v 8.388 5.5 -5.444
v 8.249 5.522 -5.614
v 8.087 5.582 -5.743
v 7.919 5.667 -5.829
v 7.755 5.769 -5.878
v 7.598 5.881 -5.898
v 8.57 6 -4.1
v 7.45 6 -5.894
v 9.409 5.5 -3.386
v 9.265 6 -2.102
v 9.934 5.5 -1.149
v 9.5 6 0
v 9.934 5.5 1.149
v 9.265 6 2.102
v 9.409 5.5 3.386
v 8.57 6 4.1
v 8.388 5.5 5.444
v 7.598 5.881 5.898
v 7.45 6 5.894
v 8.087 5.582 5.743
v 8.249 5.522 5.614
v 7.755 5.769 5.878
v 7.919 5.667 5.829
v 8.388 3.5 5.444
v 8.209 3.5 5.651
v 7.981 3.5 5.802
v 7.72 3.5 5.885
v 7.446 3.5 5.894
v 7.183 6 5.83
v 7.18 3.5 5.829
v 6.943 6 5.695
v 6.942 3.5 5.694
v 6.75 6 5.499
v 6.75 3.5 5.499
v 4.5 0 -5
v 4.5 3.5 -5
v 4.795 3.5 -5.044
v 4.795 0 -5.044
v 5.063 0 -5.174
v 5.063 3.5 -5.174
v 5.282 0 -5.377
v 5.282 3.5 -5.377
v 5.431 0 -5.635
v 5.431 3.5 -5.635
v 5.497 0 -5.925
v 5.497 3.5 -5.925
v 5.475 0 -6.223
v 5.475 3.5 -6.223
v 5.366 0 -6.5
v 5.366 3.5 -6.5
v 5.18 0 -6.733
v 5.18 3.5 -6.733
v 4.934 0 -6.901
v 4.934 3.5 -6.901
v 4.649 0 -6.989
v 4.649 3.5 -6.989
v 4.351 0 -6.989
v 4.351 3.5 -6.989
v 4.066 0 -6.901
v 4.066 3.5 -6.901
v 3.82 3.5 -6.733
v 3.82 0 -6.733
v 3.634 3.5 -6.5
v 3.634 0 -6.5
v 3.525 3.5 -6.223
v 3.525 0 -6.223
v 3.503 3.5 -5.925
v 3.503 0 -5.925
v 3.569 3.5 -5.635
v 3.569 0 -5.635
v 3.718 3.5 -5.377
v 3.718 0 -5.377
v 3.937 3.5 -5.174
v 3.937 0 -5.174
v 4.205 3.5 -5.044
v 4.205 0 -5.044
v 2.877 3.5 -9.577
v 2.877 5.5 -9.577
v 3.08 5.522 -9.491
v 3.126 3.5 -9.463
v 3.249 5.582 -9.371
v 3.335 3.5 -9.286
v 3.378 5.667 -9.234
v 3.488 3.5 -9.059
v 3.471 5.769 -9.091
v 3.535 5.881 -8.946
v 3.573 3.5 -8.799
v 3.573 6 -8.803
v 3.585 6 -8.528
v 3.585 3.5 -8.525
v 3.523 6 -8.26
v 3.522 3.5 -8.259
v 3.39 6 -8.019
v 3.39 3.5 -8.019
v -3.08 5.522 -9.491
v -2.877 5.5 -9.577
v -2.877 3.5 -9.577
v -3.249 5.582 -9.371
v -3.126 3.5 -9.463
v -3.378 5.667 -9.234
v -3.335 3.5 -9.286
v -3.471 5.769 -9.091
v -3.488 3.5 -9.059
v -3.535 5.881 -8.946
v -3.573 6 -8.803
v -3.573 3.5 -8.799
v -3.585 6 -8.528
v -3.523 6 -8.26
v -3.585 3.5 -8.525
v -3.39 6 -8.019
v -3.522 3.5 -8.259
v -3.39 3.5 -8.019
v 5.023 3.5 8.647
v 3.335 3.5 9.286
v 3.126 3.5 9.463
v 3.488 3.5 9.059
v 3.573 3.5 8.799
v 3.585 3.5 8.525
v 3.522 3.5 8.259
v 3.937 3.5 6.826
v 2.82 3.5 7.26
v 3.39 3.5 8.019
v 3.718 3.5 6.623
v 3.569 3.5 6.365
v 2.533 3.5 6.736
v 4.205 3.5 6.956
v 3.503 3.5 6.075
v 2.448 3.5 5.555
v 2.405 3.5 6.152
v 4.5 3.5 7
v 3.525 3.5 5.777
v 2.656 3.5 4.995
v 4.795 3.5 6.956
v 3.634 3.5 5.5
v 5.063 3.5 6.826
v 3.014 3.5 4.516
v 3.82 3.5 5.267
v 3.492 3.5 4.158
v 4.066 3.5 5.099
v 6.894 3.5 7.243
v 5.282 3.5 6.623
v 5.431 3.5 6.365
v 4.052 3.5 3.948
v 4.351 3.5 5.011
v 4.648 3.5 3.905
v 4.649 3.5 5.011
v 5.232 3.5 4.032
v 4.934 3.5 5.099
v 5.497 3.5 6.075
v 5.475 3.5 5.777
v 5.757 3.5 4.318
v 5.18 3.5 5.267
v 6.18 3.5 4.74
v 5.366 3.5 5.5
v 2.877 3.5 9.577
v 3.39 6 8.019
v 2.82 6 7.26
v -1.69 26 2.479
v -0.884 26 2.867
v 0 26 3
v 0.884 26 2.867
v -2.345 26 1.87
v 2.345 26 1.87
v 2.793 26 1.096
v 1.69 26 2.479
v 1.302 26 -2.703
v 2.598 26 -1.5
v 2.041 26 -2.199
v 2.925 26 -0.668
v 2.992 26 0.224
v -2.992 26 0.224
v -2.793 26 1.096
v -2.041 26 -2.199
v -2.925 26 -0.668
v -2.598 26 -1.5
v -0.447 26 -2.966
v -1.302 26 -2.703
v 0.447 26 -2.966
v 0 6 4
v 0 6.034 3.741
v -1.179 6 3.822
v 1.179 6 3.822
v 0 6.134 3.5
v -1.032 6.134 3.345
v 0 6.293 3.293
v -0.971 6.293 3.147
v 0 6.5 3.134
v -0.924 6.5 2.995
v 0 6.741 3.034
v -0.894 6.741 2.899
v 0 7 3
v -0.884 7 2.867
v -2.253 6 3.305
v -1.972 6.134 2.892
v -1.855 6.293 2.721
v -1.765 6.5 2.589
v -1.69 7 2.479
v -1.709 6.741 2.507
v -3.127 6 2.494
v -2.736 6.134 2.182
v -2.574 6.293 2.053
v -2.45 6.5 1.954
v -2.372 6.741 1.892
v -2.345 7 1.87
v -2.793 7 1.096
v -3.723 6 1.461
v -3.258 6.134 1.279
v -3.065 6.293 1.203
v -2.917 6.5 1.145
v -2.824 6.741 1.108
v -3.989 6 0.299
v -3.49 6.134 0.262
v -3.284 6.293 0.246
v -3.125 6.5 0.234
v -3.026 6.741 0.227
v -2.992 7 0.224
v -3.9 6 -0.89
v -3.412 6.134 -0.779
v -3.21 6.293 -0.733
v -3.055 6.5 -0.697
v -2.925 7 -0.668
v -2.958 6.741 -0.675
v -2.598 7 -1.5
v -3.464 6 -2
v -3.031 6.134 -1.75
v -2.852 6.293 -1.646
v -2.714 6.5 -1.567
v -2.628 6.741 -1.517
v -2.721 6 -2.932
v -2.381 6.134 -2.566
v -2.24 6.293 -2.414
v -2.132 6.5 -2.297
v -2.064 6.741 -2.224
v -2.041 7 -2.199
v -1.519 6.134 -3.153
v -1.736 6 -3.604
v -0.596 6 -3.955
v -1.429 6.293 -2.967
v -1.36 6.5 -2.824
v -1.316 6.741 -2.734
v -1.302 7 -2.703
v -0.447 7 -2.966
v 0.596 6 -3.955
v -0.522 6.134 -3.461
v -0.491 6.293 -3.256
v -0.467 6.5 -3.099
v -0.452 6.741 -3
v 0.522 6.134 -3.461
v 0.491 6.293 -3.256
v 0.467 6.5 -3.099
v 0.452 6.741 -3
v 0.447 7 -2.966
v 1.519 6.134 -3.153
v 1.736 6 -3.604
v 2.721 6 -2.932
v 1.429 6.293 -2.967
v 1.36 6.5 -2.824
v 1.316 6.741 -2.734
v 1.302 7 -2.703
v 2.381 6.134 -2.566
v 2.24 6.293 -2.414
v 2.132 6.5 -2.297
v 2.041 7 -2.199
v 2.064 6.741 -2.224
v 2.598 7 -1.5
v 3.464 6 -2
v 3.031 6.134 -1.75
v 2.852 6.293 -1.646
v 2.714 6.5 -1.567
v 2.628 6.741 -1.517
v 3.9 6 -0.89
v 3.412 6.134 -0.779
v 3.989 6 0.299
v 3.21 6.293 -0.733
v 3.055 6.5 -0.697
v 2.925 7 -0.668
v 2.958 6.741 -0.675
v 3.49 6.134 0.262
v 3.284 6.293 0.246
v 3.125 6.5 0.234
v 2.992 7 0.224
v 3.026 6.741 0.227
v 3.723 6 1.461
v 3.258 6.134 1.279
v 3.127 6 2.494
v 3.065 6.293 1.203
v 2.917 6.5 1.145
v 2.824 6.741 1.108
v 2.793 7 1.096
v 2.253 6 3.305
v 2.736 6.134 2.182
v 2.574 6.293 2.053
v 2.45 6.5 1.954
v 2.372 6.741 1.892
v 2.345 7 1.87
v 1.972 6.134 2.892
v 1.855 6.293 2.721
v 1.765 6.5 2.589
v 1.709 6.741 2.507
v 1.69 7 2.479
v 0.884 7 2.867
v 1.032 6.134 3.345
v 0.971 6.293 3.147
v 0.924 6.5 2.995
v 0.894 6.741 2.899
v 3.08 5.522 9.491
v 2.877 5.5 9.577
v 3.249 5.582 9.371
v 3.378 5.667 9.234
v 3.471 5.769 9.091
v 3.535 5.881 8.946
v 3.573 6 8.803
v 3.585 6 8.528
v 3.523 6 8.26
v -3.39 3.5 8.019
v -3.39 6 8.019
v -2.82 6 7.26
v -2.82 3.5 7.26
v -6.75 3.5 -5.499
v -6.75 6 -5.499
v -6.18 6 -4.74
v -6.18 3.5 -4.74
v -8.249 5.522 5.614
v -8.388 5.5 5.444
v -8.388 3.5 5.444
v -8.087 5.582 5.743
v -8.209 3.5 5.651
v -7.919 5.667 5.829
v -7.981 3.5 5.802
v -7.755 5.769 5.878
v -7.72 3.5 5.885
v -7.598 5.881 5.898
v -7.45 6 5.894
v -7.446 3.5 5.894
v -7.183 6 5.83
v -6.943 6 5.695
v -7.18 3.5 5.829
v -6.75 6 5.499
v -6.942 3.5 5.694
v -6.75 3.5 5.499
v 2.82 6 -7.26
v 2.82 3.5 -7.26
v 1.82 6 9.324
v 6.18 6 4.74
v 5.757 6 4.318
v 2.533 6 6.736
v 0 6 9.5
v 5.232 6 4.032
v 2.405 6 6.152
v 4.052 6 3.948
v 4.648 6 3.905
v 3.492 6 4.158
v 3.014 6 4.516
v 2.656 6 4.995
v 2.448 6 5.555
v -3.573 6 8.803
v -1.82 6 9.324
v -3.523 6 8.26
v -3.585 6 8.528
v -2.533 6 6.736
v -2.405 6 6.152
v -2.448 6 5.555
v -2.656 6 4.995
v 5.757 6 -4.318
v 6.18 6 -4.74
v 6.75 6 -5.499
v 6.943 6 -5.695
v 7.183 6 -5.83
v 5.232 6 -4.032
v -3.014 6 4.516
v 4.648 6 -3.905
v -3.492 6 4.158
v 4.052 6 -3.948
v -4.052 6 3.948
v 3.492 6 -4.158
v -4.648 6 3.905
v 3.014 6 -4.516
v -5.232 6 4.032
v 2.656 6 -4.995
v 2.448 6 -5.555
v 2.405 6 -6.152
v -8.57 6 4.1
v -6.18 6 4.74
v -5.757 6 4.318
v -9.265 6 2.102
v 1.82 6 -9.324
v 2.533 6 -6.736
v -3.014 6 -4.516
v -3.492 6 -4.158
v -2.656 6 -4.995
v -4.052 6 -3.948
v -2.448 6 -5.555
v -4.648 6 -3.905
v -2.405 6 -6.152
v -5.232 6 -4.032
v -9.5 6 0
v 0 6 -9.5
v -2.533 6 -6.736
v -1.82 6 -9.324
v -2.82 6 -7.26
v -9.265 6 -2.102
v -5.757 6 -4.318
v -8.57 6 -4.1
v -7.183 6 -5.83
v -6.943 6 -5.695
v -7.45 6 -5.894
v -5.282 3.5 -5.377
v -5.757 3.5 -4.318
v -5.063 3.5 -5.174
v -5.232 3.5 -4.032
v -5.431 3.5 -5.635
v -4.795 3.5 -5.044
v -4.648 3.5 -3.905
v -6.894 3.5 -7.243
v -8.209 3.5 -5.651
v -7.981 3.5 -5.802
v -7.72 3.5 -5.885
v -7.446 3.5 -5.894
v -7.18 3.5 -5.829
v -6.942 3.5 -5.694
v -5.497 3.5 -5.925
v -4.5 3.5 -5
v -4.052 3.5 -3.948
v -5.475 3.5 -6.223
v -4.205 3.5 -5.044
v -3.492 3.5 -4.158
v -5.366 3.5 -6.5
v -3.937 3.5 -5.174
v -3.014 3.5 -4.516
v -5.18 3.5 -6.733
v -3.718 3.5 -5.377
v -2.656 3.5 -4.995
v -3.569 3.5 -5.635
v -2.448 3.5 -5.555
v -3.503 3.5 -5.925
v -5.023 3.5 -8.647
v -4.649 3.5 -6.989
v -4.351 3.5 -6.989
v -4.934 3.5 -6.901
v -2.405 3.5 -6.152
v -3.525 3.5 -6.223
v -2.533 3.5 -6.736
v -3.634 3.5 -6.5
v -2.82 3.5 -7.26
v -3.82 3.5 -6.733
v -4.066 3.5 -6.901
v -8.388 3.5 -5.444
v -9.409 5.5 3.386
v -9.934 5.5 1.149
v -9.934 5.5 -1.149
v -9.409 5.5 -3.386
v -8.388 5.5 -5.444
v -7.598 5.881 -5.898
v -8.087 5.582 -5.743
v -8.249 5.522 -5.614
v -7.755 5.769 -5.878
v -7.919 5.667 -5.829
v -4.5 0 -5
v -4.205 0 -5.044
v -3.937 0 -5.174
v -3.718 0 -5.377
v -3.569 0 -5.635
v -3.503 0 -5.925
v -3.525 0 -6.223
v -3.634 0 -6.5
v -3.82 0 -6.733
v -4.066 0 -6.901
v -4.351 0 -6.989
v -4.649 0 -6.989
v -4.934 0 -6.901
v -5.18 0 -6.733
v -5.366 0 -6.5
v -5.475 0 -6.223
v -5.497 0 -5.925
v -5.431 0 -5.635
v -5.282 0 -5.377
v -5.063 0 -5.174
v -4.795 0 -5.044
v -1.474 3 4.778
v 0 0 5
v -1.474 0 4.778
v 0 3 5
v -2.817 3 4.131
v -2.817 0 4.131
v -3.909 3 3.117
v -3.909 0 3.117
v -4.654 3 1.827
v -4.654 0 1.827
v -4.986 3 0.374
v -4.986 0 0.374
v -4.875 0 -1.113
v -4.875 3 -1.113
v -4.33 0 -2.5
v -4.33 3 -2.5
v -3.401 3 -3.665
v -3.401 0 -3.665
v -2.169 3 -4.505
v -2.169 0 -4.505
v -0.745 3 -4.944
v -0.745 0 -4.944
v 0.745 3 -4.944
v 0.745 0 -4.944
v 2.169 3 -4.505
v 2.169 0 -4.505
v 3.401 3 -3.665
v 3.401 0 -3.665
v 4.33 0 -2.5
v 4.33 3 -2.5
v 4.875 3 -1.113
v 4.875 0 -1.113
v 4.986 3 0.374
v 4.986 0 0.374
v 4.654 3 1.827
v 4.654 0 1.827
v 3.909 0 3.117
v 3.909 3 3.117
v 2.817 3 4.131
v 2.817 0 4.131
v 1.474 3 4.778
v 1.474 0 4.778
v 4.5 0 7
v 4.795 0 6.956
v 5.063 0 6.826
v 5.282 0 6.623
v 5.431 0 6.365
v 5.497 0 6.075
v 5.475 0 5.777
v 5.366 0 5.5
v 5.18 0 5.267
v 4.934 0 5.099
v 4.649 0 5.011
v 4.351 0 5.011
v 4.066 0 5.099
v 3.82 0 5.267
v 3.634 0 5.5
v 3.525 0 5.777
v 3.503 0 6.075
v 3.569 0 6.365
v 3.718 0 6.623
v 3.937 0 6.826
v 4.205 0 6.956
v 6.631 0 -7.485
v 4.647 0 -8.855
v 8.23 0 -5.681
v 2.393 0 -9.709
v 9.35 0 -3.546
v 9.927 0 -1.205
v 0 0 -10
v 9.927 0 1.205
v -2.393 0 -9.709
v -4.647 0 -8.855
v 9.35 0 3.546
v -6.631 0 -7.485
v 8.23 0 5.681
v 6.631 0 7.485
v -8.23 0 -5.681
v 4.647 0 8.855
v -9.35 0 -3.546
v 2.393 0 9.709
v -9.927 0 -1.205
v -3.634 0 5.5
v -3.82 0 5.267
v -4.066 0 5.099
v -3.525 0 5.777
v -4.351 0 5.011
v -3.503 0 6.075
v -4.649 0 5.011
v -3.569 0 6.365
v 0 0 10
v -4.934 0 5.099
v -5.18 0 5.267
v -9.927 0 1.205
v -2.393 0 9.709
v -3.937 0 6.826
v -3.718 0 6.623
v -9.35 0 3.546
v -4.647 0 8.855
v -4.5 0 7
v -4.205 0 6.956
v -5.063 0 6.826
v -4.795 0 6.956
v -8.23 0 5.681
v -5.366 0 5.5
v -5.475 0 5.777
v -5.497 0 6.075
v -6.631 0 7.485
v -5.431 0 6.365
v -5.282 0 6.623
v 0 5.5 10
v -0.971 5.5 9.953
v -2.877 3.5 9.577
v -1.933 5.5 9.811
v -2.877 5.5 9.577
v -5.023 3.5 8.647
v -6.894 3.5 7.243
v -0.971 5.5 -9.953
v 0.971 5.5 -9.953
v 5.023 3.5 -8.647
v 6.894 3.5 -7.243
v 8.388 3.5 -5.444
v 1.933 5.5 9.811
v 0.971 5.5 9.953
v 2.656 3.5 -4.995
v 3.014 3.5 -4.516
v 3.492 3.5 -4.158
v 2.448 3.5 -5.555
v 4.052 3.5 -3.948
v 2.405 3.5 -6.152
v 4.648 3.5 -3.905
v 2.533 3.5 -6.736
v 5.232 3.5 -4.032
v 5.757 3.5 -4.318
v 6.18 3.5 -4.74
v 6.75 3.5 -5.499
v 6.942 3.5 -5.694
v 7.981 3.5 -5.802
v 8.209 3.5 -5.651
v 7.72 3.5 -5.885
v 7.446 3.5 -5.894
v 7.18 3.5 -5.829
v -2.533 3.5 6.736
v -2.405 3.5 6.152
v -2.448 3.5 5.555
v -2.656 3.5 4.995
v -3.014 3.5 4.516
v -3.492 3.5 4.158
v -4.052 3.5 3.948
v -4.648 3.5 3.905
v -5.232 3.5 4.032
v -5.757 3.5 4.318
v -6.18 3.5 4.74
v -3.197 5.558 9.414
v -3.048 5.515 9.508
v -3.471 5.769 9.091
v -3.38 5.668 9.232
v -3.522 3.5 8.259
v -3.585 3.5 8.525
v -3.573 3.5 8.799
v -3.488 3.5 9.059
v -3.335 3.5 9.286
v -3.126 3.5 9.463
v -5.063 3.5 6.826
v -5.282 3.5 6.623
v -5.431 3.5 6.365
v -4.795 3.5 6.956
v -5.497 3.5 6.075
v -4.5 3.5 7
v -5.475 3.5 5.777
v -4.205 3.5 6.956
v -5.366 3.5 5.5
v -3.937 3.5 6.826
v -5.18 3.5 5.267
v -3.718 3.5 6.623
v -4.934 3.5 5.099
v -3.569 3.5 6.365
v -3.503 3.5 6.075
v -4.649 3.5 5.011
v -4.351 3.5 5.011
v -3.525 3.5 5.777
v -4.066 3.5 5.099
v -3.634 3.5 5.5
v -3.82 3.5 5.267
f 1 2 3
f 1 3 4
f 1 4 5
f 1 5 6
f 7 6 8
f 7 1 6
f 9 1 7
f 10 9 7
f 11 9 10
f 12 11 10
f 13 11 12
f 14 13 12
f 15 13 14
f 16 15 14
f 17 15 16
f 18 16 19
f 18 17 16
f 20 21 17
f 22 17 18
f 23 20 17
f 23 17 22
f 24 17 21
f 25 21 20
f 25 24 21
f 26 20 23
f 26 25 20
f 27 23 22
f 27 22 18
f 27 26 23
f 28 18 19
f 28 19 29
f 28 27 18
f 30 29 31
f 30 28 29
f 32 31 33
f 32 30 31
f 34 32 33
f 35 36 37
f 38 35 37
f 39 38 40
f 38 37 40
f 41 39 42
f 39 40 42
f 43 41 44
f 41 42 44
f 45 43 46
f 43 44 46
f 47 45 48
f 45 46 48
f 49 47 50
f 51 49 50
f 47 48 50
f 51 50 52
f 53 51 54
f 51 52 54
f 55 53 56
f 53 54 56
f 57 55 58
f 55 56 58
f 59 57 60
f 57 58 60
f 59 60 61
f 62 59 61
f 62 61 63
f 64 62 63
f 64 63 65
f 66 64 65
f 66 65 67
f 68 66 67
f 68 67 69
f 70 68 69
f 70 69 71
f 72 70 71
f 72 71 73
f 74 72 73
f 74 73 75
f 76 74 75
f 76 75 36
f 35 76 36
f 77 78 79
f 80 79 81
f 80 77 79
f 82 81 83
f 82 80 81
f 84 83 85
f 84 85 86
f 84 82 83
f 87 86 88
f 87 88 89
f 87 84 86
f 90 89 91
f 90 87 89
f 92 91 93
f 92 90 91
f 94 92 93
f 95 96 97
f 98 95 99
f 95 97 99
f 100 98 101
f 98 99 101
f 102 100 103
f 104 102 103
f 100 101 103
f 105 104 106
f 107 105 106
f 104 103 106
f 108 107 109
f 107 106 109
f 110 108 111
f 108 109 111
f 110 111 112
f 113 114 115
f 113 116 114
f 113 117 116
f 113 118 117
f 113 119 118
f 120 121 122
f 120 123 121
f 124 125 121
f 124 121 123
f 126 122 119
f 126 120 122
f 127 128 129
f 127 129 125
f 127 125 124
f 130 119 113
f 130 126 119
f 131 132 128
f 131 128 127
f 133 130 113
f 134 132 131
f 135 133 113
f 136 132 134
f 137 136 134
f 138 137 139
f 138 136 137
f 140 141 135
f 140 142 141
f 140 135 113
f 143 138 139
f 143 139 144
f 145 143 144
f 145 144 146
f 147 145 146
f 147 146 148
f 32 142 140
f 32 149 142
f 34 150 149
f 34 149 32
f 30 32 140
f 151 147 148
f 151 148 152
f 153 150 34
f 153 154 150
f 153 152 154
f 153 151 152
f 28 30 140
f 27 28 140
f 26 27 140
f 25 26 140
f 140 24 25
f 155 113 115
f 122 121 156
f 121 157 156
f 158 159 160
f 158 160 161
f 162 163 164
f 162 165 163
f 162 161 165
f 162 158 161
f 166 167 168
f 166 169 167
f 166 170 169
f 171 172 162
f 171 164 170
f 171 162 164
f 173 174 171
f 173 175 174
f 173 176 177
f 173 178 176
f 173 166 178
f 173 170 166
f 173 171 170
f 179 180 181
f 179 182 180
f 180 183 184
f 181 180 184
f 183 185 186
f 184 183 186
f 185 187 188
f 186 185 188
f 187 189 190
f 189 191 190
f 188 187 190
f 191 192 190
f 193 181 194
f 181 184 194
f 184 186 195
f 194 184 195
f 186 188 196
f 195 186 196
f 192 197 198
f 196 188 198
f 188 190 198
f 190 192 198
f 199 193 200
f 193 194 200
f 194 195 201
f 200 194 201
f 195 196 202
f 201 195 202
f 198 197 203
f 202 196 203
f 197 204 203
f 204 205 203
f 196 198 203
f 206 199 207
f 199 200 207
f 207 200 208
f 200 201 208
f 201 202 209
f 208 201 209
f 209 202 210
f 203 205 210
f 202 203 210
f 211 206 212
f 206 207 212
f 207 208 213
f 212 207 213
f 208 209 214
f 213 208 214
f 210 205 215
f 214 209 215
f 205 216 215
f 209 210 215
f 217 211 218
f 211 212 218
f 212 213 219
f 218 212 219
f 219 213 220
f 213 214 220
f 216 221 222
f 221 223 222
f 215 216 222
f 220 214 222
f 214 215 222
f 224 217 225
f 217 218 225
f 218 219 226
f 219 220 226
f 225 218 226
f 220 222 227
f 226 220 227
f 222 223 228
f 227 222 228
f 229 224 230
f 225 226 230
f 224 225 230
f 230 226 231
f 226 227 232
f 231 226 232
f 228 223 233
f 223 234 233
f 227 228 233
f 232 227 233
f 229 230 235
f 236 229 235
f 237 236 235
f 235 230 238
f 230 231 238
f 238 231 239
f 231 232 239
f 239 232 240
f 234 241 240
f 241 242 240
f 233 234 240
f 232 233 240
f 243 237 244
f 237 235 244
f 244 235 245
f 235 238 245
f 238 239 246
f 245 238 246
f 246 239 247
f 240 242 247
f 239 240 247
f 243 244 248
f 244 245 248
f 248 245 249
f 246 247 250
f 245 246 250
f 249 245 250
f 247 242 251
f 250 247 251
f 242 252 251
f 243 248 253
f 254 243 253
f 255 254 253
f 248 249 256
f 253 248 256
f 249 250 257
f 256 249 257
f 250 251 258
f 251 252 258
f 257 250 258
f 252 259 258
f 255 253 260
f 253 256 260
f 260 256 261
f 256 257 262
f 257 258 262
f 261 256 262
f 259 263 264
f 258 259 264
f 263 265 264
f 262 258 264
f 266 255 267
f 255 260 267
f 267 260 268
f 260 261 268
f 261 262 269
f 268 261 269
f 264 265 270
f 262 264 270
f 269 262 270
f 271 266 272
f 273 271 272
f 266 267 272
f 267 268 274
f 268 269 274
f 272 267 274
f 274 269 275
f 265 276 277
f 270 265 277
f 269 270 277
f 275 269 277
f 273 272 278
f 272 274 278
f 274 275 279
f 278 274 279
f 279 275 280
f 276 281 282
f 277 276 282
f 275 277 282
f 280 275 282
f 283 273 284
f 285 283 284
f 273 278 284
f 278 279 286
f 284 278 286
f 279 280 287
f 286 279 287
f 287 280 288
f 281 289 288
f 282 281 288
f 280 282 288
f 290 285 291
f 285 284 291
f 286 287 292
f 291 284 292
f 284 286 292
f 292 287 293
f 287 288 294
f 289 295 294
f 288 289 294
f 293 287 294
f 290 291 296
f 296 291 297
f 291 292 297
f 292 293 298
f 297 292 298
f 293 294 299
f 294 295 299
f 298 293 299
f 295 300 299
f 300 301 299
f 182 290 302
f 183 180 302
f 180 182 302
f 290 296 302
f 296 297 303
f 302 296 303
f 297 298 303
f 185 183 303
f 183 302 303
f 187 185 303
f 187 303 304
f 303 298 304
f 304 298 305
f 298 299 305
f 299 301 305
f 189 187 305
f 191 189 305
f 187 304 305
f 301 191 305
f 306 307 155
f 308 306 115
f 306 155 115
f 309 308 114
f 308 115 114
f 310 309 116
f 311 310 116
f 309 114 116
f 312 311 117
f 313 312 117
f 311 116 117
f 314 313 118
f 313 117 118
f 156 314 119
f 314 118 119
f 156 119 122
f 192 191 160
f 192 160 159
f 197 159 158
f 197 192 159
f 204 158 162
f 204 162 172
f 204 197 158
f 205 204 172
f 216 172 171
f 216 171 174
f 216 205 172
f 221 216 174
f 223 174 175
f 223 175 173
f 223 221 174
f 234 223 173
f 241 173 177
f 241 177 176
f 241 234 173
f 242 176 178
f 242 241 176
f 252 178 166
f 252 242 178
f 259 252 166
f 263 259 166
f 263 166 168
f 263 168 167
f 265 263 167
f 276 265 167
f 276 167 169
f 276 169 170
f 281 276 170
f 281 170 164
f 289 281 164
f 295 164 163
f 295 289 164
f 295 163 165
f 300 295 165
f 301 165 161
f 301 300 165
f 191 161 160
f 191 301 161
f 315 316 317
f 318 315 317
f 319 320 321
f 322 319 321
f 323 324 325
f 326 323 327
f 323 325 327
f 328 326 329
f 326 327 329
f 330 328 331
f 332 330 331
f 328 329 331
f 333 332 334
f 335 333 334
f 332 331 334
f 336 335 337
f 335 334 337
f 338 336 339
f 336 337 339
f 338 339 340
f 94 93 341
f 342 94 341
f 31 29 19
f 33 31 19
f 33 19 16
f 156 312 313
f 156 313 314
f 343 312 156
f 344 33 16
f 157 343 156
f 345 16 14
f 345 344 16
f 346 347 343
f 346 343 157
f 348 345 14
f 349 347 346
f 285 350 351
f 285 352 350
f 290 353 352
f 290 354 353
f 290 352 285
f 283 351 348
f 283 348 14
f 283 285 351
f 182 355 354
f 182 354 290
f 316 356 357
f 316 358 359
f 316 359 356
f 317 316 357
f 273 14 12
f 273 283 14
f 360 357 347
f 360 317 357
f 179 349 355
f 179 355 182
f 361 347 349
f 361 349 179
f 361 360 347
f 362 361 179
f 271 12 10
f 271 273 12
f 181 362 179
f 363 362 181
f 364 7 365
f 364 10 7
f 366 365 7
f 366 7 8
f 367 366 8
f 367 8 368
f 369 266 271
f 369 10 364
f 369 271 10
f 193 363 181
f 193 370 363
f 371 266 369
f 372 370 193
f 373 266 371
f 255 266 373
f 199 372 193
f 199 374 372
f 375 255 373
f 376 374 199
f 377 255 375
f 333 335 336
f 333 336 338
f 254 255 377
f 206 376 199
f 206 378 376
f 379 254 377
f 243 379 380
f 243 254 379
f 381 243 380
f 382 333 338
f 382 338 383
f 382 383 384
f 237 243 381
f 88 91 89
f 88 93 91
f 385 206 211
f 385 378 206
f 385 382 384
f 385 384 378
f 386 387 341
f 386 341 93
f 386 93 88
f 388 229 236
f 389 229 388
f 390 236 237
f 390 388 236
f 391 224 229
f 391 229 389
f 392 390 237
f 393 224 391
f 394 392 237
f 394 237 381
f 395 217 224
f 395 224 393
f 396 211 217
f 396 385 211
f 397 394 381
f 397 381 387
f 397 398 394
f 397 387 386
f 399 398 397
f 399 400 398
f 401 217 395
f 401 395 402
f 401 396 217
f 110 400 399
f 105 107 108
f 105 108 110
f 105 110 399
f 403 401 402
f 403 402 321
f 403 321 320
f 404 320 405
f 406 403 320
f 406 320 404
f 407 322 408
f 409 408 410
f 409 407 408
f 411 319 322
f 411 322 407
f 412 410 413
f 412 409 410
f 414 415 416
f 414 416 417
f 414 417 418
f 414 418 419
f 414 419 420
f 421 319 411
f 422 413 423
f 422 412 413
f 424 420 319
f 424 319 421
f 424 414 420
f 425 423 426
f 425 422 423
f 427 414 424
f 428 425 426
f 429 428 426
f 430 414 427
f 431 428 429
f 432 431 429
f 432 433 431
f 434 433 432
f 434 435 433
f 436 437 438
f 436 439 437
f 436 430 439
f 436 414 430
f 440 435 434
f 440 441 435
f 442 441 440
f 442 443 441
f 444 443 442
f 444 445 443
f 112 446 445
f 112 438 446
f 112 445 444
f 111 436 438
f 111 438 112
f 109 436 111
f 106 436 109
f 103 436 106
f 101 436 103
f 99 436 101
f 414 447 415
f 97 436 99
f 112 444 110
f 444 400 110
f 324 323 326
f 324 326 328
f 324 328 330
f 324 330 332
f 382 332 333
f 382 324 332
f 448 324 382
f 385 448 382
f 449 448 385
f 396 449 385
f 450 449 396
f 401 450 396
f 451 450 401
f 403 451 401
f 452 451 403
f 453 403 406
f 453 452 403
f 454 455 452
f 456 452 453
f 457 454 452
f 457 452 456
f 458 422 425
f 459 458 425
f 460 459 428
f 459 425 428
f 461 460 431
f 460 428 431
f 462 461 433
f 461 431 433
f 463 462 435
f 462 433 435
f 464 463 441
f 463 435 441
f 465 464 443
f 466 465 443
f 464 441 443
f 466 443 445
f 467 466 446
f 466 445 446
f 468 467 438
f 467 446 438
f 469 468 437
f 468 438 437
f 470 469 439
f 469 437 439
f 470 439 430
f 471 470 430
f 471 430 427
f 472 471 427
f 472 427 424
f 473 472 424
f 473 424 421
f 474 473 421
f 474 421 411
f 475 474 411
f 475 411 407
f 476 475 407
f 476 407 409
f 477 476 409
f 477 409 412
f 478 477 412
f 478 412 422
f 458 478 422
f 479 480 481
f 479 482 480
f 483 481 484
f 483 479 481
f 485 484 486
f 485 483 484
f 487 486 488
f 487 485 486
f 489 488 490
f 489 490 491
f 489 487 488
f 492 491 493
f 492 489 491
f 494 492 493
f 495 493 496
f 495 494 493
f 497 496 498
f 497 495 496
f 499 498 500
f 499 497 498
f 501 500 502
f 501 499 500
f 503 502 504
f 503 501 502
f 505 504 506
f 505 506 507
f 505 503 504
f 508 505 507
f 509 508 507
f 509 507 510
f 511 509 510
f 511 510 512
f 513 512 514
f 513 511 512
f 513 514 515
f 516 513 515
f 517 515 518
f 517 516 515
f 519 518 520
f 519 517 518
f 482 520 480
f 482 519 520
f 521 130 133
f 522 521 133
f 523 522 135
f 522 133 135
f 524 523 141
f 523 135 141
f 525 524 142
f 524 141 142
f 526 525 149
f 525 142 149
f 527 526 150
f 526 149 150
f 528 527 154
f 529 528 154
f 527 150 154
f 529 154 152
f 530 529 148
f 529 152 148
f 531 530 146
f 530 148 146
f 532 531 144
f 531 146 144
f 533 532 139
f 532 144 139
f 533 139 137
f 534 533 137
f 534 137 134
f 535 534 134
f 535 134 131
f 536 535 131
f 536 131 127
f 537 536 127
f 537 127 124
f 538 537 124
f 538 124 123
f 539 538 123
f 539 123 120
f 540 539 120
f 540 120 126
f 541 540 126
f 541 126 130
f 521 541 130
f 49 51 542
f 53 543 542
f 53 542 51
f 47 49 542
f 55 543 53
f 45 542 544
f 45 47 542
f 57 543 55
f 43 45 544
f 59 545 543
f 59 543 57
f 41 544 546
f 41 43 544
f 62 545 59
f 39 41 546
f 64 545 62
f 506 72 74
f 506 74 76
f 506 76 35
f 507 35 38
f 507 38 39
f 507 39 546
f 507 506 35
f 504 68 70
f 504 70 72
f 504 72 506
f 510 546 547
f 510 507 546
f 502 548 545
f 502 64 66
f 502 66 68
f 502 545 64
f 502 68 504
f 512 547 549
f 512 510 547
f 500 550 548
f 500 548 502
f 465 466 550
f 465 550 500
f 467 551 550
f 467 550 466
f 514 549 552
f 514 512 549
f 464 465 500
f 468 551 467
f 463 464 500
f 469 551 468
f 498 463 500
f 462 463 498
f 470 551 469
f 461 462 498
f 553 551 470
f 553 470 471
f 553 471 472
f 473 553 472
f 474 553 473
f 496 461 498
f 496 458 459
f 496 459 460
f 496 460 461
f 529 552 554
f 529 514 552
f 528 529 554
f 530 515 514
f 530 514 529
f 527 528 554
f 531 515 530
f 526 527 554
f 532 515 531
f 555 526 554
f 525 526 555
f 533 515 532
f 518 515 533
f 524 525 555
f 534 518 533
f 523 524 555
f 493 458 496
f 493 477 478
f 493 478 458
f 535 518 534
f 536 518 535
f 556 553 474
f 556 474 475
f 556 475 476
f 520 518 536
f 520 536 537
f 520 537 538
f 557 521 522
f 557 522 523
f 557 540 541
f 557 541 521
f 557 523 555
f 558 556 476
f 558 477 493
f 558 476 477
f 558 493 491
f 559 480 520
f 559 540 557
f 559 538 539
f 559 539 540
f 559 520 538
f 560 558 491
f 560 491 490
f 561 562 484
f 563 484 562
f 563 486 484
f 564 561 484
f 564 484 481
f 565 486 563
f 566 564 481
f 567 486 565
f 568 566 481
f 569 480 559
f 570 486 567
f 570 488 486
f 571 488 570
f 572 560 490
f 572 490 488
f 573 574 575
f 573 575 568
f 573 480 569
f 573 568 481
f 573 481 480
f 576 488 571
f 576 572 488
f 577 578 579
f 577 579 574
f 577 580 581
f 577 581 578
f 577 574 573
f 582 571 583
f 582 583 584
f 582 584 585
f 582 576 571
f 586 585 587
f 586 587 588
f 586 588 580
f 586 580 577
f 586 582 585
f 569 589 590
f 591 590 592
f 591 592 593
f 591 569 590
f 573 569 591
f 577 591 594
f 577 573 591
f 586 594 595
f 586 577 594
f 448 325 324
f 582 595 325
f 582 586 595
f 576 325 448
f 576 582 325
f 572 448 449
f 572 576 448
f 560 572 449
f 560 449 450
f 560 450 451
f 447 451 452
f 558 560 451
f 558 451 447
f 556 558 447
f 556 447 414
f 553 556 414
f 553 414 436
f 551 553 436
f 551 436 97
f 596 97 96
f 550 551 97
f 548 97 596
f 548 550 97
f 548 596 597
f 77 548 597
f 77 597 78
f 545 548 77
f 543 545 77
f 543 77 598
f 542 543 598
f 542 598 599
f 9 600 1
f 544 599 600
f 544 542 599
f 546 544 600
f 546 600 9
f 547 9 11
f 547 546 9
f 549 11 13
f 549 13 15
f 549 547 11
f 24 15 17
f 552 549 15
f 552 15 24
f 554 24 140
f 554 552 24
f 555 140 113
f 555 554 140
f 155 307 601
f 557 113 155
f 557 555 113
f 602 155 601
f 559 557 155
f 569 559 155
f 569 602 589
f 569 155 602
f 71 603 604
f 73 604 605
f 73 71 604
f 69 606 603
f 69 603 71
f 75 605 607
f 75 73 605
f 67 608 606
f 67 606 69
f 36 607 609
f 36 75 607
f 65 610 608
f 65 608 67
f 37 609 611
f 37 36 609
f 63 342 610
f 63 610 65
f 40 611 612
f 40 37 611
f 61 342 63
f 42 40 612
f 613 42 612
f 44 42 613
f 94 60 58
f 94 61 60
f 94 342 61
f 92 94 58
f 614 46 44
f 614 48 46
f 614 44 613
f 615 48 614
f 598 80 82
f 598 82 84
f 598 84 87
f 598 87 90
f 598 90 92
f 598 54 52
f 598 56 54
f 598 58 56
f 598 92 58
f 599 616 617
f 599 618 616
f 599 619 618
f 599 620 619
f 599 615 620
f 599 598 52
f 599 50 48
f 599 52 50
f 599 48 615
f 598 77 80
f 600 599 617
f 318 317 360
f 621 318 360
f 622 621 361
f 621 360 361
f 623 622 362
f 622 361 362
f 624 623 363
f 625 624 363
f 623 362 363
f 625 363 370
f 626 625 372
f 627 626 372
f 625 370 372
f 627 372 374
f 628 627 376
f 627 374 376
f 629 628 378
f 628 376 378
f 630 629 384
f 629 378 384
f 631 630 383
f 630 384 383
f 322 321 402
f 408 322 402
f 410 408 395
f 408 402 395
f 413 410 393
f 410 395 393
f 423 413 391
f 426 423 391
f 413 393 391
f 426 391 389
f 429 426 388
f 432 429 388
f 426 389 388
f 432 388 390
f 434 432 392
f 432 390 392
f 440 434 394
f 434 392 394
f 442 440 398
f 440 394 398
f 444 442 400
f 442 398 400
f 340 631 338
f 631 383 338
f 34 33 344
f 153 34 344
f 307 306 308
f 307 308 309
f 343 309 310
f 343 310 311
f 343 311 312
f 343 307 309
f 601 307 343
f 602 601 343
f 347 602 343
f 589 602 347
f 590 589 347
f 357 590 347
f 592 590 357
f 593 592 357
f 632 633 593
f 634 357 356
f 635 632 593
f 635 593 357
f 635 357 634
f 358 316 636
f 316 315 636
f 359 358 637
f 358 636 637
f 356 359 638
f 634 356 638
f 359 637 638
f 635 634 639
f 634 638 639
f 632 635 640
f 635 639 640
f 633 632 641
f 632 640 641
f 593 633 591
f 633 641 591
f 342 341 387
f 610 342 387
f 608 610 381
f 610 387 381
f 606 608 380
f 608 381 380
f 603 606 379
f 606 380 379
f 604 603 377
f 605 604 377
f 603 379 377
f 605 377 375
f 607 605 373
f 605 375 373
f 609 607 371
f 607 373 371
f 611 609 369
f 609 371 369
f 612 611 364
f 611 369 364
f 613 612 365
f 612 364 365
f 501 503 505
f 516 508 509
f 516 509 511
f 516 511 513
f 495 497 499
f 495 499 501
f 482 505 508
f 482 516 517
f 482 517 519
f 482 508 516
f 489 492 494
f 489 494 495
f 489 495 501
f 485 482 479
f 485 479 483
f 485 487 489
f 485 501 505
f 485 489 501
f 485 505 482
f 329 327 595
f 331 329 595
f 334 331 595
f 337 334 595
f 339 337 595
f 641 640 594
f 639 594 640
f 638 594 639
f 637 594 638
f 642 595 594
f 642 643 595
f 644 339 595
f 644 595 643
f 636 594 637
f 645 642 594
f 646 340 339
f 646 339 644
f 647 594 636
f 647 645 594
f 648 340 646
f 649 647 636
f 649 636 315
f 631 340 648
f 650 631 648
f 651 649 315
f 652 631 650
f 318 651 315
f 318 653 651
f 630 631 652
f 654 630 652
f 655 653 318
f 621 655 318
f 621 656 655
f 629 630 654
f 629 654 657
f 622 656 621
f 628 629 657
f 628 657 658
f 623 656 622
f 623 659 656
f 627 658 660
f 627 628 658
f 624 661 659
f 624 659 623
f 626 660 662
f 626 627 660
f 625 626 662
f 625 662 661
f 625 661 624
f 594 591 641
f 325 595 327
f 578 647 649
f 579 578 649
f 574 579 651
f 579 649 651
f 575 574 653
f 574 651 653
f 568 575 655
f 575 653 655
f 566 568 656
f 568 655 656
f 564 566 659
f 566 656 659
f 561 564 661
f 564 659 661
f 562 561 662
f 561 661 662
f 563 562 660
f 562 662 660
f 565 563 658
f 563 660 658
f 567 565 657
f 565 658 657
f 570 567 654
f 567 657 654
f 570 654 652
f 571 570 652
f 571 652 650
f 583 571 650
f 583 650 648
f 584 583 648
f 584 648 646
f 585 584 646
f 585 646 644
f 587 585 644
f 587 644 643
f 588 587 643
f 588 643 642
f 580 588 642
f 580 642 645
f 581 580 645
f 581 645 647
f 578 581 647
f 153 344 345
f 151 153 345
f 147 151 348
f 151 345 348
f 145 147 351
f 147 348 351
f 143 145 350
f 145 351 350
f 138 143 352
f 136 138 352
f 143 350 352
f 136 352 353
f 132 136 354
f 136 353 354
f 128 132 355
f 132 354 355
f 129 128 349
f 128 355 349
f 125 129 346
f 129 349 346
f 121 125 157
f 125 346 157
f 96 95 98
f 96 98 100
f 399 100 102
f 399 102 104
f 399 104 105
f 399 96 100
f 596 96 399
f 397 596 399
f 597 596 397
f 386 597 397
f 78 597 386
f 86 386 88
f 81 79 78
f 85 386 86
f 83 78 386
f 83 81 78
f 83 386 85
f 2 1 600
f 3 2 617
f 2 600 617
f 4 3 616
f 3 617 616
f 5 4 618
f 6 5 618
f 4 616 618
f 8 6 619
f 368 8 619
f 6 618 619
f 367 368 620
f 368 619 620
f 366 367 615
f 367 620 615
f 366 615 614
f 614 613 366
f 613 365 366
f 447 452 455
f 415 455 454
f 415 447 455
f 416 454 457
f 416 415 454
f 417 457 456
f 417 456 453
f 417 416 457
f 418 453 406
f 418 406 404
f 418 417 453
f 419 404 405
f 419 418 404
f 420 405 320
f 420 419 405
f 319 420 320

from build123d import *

# Parameters (mm, degrees)
SKETCH_2_R          = 1.0000000000000002
SKETCH_2_R_2        = 0.9999999999999998
CUT_EXTRUDE_1_DEPTH = 10
SKETCH_3_R          = 1.0000000000000002
SKETCH_3_R_2        = 0.9999999999999998
CUT_EXTRUDE_2_DEPTH = 2.5
FILLET_1_R          = 1
FILLET_2_R          = 1


with BuildPart() as part:
    # 草图1 → 旋转1 (revolve)
    with BuildSketch(Plane.XY, mode=Mode.PRIVATE) as revolve_1_sk:
        Polygon((-1.97e-15, 26), (2.999999999999997, 26), (3, 6), (9.5, 5.999999999999999), (10.000000000000002, 5.5), (10, -1.2e-16), (5.000000000000001, -6.1e-16), (5.000000000000002, 2.9999999999999996), (8.7e-16, 2.999999999999999), align=None)
    revolve(revolve_1_sk.sketch.rotate(Axis((0, 9.947317903416637, 0), (0, -1, 0)), 90), axis=Axis((0, 9.947317903416637, 0), (0, -1, 0)))

    # 草图2 → 切除-拉伸1 (cut)
    with BuildSketch(Plane(origin=(0, 6, 0), x_dir=(1, 0, 0), z_dir=(0, 1, 0))):
        with Locations(Location((-4.5, 6.000000000000001, 0), (0, 0, 270))):
            Circle(SKETCH_2_R)
        with Locations(Location((4.5, 6.000000000000003, 0), (0, 0, 270))):
            Circle(SKETCH_2_R_2)
        with Locations(Location((4.5, -5.999999999999997, 0), (0, 0, 270))):
            Circle(SKETCH_2_R_2)
        with Locations(Location((-4.5, -5.999999999999999, 0), (0, 0, 270))):
            Circle(SKETCH_2_R)
    extrude(amount=-CUT_EXTRUDE_1_DEPTH, mode=Mode.SUBTRACT)

    # 草图3 → 切除-拉伸2 (cut)
    # profile 1 of 8: a face of its own
    with BuildSketch(Plane(origin=(0, 6, 0), x_dir=(1, 0, 0), z_dir=(0, 1, 0))):
        with BuildLine():
            Line((-9.157565431651806, 8.710087242202405), (-7.2389927145122455, 6.151990286016327))
            ThreePointArc((-7.2389927145121735, 6.151990286016362), (-5.700000000000015, 7.599999999999989), (-3.8789927145123357, 8.67199028601625))
            Line((-3.8789927145122554, 8.67199028601634), (-5.797565431651803, 11.230087242202407))
            Line((-5.797565431651803, 11.230087242202407), (-9.157565431651806, 8.710087242202405))
        make_face()
    # profile 2 of 8: a face of its own
    with BuildSketch(Plane(origin=(0, 6, 0), x_dir=(1, 0, 0), z_dir=(0, 1, 0))):
        with BuildLine():
            ThreePointArc((-3.8789927145123357, 8.67199028601625), (-5.700000000000015, 7.599999999999989), (-7.2389927145121735, 6.151990286016362))
            Line((-7.2389927145122455, 6.151990286016327), (-6.18, 4.739999999999999))
            ThreePointArc((-6.18, 4.739999999999998), (-3.24, 4.3199999999999985), (-2.819999999999999, 7.259999999999998))
            Line((-2.819999999999999, 7.259999999999998), (-3.8789927145122554, 8.67199028601634))
        make_face()
        with Locations(Location((-4.5, 6.000000000000001, 0), (0, 0, 270))):
            Circle(SKETCH_3_R, mode=Mode.SUBTRACT)
    # profile 3 of 8: a face of its own
    with BuildSketch(Plane(origin=(0, 6, 0), x_dir=(1, 0, 0), z_dir=(0, 1, 0))):
        with BuildLine():
            ThreePointArc((7.2389927145121815, 6.1519902860163524), (5.700000000000022, 7.599999999999984), (3.878992714512337, 8.67199028601625))
            Line((3.8789927145122567, 8.671990286016342), (2.819999999999999, 7.259999999999998))
            ThreePointArc((2.8199999999999985, 7.259999999999998), (3.24, 4.319999999999999), (6.18, 4.739999999999999))
            Line((6.18, 4.739999999999999), (7.238992714512243, 6.151990286016323))
        make_face()
        with Locations(Location((4.5, 6.000000000000003, 0), (0, 0, 270))):
            Circle(SKETCH_3_R_2, mode=Mode.SUBTRACT)
    # profile 4 of 8: a face of its own
    with BuildSketch(Plane(origin=(0, 6, 0), x_dir=(1, 0, 0), z_dir=(0, 1, 0))):
        with BuildLine():
            Line((5.797565431651803, 11.230087242202407), (3.8789927145122567, 8.671990286016342))
            ThreePointArc((3.878992714512337, 8.67199028601625), (5.700000000000022, 7.599999999999984), (7.2389927145121815, 6.1519902860163524))
            Line((7.238992714512243, 6.151990286016323), (9.157565431651806, 8.710087242202405))
            Line((9.157565431651806, 8.710087242202405), (5.797565431651803, 11.230087242202407))
        make_face()
    # profile 5 of 8: a face of its own
    with BuildSketch(Plane(origin=(0, 6, 0), x_dir=(1, 0, 0), z_dir=(0, 1, 0))):
        with BuildLine():
            Line((2.819999999999999, -7.259999999999998), (3.8789927145122527, -8.671990286016337))
            ThreePointArc((3.8789927145123175, -8.671990286016259), (5.700000000000012, -7.599999999999992), (7.238992714512178, -6.151990286016356))
            Line((7.238992714512243, -6.151990286016323), (6.18, -4.739999999999999))
            ThreePointArc((6.18, -4.739999999999999), (3.24, -4.319999999999999), (2.8199999999999985, -7.259999999999998))
        make_face()
        with Locations(Location((4.5, -5.999999999999997, 0), (0, 0, 270))):
            Circle(SKETCH_3_R_2, mode=Mode.SUBTRACT)
    # profile 6 of 8: a face of its own
    with BuildSketch(Plane(origin=(0, 6, 0), x_dir=(1, 0, 0), z_dir=(0, 1, 0))):
        with BuildLine():
            ThreePointArc((7.238992714512178, -6.151990286016356), (5.700000000000012, -7.599999999999992), (3.8789927145123175, -8.671990286016259))
            Line((3.8789927145122527, -8.671990286016337), (5.797565431651803, -11.230087242202407))
            Line((5.797565431651803, -11.230087242202407), (9.157565431651806, -8.710087242202405))
            Line((9.157565431651806, -8.710087242202405), (7.238992714512243, -6.151990286016323))
        make_face()
    # profile 7 of 8: a face of its own
    with BuildSketch(Plane(origin=(0, 6, 0), x_dir=(1, 0, 0), z_dir=(0, 1, 0))):
        with BuildLine():
            ThreePointArc((-2.819999999999999, -7.259999999999998), (-2.4211060633115498, -5.703015151901651), (-3.239999999999995, -4.320000000000003))
            ThreePointArc((-3.239999999999995, -4.320000000000003), (-4.796984848098346, -3.921106063311549), (-6.18, -4.739999999999998))
            Line((-6.18, -4.739999999999999), (-7.238992714512246, -6.151990286016328))
            ThreePointArc((-7.238992714512174, -6.15199028601636), (-5.7000000000000135, -7.59999999999999), (-3.8789927145123286, -8.671990286016255))
            Line((-3.8789927145122527, -8.671990286016337), (-2.819999999999999, -7.259999999999998))
        make_face()
        with BuildLine():
            ThreePointArc((-3.5, -5.999999999999999), (-5.3944271909999175, -6.447213595499955), (-3.899999999999996, -5.200000000000002))
            ThreePointArc((-3.899999999999996, -5.200000000000002), (-3.605572809000083, -5.5527864045000435), (-3.5, -5.999999999999999))
        make_face(mode=Mode.SUBTRACT)
    # profile 8 of 8: a face of its own
    with BuildSketch(Plane(origin=(0, 6, 0), x_dir=(1, 0, 0), z_dir=(0, 1, 0))):
        with BuildLine():
            ThreePointArc((-3.8789927145123286, -8.671990286016255), (-5.7000000000000135, -7.59999999999999), (-7.238992714512174, -6.15199028601636))
            Line((-7.238992714512246, -6.151990286016328), (-9.157565431651806, -8.710087242202405))
            Line((-9.157565431651806, -8.710087242202405), (-5.797565431651803, -11.230087242202407))
            Line((-5.797565431651803, -11.230087242202407), (-3.8789927145122527, -8.671990286016337))
        make_face()
    extrude(amount=-CUT_EXTRUDE_2_DEPTH, mode=Mode.SUBTRACT)

    # 圆角1
    fillet_1_edges = [part.edges().sort_by_distance(p)[0] for p in [
        (7.5462083154282915, 4.5, -6.56161108723772),
        (4.18620831542829, 4.5, -9.08161108723772),
        (4.18620831542829, 4.5, 9.08161108723772),
        (7.5462083154282915, 4.5, 6.561611087237719),
        (-4.18620831542829, 4.5, 9.08161108723772),
        (-7.546208315428291, 4.5, 6.56161108723772),
        (-7.54620831542829, 4.5, -6.561611087237719),
        (-4.186208315428289, 4.5, -9.08161108723772),
    ]]
    fillet(fillet_1_edges, radius=FILLET_1_R)

    # 圆角2
    fillet_2_edges = [part.edges().sort_by_distance(p)[0] for p in [
        (-7e-16, 6, -3),
    ]]
    fillet(fillet_2_edges, radius=FILLET_2_R)


solid = part.part
